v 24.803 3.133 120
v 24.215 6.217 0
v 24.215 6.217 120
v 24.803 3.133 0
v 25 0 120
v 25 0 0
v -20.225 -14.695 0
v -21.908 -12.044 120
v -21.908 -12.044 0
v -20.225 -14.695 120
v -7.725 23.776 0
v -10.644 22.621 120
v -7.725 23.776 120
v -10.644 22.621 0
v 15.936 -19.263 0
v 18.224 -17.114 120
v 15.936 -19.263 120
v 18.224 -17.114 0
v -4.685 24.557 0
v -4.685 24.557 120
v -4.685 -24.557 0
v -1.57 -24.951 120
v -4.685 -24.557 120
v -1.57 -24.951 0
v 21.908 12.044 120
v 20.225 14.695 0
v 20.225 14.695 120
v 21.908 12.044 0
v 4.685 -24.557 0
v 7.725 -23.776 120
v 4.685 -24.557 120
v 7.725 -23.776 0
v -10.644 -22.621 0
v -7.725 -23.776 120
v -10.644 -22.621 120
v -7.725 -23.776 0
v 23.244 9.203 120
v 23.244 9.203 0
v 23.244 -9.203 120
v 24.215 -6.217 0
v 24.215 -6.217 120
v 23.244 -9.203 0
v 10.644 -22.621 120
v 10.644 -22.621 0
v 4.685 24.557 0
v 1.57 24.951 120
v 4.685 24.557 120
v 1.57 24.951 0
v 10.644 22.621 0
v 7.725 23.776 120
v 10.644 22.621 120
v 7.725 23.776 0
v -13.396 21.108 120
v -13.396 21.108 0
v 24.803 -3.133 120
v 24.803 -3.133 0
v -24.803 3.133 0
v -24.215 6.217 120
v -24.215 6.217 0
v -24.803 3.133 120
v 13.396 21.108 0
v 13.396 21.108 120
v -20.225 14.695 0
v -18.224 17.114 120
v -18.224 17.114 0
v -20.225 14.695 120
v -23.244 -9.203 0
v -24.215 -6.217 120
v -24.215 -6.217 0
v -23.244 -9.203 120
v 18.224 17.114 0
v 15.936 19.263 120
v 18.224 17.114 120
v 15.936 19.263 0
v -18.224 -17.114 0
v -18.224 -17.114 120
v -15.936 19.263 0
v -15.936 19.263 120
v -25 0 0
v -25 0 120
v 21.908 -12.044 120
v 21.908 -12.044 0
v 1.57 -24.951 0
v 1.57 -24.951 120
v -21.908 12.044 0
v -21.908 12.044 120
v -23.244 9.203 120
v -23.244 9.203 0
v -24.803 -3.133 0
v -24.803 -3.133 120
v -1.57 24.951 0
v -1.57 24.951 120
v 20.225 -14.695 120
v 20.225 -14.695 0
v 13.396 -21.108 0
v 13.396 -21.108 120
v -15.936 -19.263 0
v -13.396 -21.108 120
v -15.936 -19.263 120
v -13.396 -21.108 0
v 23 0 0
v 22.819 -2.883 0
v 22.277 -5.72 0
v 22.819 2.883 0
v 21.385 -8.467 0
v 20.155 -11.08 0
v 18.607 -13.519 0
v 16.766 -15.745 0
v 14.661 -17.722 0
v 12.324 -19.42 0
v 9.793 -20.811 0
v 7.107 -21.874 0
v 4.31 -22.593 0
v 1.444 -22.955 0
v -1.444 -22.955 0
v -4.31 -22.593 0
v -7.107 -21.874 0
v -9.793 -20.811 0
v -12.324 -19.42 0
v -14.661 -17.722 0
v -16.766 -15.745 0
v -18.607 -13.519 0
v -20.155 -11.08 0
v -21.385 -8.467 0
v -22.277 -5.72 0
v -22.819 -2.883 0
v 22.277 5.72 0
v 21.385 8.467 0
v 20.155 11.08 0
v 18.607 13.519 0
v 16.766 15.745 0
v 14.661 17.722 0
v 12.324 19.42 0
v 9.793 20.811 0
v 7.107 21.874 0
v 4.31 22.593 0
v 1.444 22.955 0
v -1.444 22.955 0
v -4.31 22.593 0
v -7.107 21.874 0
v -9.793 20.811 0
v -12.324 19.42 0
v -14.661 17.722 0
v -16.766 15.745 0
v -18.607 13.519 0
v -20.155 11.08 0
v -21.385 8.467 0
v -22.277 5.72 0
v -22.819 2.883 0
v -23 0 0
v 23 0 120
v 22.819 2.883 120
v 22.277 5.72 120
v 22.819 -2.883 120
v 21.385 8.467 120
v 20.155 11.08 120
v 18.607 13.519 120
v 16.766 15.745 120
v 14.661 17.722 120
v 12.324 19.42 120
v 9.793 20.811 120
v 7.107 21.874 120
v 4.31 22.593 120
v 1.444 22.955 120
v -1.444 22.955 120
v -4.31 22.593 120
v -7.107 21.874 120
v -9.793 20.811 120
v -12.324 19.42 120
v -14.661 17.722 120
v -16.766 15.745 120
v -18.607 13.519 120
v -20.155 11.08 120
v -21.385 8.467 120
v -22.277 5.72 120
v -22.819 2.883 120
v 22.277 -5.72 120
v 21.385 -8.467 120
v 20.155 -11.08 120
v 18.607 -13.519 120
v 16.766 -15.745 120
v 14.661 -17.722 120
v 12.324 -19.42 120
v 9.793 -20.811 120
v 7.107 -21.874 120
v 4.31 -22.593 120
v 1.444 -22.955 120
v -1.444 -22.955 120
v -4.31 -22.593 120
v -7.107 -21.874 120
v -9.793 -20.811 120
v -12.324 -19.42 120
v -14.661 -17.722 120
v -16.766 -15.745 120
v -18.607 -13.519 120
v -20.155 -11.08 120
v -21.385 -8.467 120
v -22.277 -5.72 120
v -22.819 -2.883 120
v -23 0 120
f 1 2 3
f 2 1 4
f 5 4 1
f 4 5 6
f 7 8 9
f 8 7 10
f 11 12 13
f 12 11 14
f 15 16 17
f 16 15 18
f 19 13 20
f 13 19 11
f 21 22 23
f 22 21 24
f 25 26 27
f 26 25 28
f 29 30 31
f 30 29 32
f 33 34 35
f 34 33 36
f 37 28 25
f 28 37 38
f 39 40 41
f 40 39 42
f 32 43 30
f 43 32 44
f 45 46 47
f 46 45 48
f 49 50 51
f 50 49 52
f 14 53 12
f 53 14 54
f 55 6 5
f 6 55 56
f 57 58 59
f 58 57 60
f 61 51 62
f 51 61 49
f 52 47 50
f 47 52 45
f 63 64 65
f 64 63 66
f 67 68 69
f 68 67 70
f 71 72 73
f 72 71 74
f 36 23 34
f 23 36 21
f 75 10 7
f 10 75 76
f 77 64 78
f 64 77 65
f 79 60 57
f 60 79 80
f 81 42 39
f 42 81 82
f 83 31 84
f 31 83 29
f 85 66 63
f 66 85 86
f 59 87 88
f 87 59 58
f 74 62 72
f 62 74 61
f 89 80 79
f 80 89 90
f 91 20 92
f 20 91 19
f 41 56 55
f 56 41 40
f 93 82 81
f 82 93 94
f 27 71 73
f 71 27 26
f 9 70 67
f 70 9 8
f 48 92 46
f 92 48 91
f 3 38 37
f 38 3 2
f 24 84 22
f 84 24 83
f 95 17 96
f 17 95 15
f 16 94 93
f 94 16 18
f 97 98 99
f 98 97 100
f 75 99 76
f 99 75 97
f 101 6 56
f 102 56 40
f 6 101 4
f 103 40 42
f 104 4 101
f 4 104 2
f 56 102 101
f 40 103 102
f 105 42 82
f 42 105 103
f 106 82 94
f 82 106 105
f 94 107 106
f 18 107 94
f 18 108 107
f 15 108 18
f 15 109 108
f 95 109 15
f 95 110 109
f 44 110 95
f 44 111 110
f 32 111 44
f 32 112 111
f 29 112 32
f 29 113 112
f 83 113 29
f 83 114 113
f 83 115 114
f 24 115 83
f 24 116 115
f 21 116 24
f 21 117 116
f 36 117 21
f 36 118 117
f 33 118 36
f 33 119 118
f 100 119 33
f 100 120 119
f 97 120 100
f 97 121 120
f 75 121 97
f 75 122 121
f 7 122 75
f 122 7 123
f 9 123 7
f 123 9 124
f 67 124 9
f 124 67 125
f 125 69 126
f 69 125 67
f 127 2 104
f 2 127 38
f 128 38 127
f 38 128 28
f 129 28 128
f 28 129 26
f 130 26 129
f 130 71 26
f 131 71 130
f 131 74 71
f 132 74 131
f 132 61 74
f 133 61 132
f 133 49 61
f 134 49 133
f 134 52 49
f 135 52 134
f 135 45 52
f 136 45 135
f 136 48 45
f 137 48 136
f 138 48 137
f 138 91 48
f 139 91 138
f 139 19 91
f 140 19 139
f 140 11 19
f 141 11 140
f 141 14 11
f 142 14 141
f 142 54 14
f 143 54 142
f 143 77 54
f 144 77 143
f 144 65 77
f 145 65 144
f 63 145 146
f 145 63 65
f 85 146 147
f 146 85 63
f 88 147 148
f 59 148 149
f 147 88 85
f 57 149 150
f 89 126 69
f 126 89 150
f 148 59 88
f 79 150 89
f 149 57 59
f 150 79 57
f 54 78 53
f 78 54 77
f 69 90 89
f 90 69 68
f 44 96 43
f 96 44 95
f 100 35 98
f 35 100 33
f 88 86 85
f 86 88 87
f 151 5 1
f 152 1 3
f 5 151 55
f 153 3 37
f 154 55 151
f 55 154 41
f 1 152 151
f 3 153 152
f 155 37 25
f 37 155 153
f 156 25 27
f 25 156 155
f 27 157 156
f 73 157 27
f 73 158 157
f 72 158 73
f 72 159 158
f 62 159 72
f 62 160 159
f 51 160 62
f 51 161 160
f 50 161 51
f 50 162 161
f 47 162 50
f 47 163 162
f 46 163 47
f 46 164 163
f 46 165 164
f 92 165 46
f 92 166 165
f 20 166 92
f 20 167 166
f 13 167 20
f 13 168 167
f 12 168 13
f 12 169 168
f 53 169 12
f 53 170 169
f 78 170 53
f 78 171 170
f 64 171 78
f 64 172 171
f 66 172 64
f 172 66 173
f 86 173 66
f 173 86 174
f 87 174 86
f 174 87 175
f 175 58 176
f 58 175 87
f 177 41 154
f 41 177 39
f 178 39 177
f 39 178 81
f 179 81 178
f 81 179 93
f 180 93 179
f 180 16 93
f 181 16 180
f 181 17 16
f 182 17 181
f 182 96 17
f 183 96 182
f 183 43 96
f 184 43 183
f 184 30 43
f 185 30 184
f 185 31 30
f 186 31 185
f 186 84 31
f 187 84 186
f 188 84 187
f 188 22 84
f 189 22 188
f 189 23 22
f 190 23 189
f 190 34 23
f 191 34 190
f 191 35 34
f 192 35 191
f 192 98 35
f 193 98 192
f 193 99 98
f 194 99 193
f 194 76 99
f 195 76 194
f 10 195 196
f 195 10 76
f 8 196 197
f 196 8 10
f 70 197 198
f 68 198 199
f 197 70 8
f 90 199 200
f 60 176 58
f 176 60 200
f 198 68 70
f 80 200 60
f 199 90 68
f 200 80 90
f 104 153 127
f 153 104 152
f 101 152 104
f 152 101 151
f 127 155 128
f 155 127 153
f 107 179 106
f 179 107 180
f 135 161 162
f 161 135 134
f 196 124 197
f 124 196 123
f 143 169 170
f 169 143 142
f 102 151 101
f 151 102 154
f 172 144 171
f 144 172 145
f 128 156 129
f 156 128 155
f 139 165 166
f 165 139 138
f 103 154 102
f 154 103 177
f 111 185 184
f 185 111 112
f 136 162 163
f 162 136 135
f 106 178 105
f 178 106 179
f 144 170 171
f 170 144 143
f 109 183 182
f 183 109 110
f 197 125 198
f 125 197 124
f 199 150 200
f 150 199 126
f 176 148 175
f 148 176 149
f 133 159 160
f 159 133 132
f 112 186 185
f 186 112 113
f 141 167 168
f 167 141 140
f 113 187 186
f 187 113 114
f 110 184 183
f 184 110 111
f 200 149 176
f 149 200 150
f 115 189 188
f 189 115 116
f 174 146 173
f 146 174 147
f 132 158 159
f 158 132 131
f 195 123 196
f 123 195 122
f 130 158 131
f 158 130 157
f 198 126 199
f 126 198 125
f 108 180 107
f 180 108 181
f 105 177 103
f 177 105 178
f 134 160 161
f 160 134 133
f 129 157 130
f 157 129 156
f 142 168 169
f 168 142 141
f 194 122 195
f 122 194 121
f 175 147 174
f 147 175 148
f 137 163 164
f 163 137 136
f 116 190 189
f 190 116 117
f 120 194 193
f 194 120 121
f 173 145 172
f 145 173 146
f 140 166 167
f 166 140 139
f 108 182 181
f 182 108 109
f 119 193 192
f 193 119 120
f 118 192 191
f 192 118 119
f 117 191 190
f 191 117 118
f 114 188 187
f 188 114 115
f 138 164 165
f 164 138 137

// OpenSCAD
// file: _variables.scad
// Length of the lamp shade
LENGTH = 120;
// Outer diameter of the lamp in general
DIAMETER = 50;
// Material strength
RIM = 2;

$fn=50;

// Thickness of the heatsink copper material
HEATSINK_THICKNESS = 1;
// Source file (DXF) of the 2D profile of the heat sink
HEATSINK_SHAPE = "heatsink-shape.dxf";
// Material thickness of the shade
SHADE_THICKNESS = 2;
// CALCULATED: Inner diameter of the lamp shade
INNER_DIAMETER = DIAMETER - 2*SHADE_THICKNESS;

// Thickness (along the axis of the lamp) of the encoder dial
DIAL_THICKNESS = 10;
// Number of teeth on the encoder dial
DIAL_TEETH = 240;
// Depth of each tooth on the encoder dial
DIAL_TEETH_DEPTH = 1;
// CALCULATED: Angle between two neightbouring teeth on the encoder dial
DIAL_TEETH_ANGLE = 360/DIAL_TEETH;

// Source file of the 2D outline of the pcb
PCB_OUTLINE = "./../electronics-design/board-outline.dxf";
// Total thickness of all PCBs with components
PCB_THICKNESS = 10;

// Length (along axis of the lamp) of the "passive" end cap, outside the lamp shade
CAP_OUTER_LENGTH =  5;
// Length (along axis of the lamp) of the "passive" end cap, inside the lamp shade
CAP_INNER_LENGTH = 5;

// Diameter of the hole that the power jack needs in order to protrude through the case
JACK_DRILL_DIAMETER = 5;
// Maximum diameter of that part of the power jack that will be inside the lamp casing
JACK_MAX_DIAMETER = 7;
// Length of that part of the power jack that will be inside the lamp casing
JACK_INNER_LENGTH = 2;
// main file
include <_variables.scad>;


module shade()
{
	difference() {
		cylinder(d = DIAMETER, h = LENGTH);
		translate([0, 0, -1])
		cylinder(d = INNER_DIAMETER, h = LENGTH + 2);
	}
}

shade();
